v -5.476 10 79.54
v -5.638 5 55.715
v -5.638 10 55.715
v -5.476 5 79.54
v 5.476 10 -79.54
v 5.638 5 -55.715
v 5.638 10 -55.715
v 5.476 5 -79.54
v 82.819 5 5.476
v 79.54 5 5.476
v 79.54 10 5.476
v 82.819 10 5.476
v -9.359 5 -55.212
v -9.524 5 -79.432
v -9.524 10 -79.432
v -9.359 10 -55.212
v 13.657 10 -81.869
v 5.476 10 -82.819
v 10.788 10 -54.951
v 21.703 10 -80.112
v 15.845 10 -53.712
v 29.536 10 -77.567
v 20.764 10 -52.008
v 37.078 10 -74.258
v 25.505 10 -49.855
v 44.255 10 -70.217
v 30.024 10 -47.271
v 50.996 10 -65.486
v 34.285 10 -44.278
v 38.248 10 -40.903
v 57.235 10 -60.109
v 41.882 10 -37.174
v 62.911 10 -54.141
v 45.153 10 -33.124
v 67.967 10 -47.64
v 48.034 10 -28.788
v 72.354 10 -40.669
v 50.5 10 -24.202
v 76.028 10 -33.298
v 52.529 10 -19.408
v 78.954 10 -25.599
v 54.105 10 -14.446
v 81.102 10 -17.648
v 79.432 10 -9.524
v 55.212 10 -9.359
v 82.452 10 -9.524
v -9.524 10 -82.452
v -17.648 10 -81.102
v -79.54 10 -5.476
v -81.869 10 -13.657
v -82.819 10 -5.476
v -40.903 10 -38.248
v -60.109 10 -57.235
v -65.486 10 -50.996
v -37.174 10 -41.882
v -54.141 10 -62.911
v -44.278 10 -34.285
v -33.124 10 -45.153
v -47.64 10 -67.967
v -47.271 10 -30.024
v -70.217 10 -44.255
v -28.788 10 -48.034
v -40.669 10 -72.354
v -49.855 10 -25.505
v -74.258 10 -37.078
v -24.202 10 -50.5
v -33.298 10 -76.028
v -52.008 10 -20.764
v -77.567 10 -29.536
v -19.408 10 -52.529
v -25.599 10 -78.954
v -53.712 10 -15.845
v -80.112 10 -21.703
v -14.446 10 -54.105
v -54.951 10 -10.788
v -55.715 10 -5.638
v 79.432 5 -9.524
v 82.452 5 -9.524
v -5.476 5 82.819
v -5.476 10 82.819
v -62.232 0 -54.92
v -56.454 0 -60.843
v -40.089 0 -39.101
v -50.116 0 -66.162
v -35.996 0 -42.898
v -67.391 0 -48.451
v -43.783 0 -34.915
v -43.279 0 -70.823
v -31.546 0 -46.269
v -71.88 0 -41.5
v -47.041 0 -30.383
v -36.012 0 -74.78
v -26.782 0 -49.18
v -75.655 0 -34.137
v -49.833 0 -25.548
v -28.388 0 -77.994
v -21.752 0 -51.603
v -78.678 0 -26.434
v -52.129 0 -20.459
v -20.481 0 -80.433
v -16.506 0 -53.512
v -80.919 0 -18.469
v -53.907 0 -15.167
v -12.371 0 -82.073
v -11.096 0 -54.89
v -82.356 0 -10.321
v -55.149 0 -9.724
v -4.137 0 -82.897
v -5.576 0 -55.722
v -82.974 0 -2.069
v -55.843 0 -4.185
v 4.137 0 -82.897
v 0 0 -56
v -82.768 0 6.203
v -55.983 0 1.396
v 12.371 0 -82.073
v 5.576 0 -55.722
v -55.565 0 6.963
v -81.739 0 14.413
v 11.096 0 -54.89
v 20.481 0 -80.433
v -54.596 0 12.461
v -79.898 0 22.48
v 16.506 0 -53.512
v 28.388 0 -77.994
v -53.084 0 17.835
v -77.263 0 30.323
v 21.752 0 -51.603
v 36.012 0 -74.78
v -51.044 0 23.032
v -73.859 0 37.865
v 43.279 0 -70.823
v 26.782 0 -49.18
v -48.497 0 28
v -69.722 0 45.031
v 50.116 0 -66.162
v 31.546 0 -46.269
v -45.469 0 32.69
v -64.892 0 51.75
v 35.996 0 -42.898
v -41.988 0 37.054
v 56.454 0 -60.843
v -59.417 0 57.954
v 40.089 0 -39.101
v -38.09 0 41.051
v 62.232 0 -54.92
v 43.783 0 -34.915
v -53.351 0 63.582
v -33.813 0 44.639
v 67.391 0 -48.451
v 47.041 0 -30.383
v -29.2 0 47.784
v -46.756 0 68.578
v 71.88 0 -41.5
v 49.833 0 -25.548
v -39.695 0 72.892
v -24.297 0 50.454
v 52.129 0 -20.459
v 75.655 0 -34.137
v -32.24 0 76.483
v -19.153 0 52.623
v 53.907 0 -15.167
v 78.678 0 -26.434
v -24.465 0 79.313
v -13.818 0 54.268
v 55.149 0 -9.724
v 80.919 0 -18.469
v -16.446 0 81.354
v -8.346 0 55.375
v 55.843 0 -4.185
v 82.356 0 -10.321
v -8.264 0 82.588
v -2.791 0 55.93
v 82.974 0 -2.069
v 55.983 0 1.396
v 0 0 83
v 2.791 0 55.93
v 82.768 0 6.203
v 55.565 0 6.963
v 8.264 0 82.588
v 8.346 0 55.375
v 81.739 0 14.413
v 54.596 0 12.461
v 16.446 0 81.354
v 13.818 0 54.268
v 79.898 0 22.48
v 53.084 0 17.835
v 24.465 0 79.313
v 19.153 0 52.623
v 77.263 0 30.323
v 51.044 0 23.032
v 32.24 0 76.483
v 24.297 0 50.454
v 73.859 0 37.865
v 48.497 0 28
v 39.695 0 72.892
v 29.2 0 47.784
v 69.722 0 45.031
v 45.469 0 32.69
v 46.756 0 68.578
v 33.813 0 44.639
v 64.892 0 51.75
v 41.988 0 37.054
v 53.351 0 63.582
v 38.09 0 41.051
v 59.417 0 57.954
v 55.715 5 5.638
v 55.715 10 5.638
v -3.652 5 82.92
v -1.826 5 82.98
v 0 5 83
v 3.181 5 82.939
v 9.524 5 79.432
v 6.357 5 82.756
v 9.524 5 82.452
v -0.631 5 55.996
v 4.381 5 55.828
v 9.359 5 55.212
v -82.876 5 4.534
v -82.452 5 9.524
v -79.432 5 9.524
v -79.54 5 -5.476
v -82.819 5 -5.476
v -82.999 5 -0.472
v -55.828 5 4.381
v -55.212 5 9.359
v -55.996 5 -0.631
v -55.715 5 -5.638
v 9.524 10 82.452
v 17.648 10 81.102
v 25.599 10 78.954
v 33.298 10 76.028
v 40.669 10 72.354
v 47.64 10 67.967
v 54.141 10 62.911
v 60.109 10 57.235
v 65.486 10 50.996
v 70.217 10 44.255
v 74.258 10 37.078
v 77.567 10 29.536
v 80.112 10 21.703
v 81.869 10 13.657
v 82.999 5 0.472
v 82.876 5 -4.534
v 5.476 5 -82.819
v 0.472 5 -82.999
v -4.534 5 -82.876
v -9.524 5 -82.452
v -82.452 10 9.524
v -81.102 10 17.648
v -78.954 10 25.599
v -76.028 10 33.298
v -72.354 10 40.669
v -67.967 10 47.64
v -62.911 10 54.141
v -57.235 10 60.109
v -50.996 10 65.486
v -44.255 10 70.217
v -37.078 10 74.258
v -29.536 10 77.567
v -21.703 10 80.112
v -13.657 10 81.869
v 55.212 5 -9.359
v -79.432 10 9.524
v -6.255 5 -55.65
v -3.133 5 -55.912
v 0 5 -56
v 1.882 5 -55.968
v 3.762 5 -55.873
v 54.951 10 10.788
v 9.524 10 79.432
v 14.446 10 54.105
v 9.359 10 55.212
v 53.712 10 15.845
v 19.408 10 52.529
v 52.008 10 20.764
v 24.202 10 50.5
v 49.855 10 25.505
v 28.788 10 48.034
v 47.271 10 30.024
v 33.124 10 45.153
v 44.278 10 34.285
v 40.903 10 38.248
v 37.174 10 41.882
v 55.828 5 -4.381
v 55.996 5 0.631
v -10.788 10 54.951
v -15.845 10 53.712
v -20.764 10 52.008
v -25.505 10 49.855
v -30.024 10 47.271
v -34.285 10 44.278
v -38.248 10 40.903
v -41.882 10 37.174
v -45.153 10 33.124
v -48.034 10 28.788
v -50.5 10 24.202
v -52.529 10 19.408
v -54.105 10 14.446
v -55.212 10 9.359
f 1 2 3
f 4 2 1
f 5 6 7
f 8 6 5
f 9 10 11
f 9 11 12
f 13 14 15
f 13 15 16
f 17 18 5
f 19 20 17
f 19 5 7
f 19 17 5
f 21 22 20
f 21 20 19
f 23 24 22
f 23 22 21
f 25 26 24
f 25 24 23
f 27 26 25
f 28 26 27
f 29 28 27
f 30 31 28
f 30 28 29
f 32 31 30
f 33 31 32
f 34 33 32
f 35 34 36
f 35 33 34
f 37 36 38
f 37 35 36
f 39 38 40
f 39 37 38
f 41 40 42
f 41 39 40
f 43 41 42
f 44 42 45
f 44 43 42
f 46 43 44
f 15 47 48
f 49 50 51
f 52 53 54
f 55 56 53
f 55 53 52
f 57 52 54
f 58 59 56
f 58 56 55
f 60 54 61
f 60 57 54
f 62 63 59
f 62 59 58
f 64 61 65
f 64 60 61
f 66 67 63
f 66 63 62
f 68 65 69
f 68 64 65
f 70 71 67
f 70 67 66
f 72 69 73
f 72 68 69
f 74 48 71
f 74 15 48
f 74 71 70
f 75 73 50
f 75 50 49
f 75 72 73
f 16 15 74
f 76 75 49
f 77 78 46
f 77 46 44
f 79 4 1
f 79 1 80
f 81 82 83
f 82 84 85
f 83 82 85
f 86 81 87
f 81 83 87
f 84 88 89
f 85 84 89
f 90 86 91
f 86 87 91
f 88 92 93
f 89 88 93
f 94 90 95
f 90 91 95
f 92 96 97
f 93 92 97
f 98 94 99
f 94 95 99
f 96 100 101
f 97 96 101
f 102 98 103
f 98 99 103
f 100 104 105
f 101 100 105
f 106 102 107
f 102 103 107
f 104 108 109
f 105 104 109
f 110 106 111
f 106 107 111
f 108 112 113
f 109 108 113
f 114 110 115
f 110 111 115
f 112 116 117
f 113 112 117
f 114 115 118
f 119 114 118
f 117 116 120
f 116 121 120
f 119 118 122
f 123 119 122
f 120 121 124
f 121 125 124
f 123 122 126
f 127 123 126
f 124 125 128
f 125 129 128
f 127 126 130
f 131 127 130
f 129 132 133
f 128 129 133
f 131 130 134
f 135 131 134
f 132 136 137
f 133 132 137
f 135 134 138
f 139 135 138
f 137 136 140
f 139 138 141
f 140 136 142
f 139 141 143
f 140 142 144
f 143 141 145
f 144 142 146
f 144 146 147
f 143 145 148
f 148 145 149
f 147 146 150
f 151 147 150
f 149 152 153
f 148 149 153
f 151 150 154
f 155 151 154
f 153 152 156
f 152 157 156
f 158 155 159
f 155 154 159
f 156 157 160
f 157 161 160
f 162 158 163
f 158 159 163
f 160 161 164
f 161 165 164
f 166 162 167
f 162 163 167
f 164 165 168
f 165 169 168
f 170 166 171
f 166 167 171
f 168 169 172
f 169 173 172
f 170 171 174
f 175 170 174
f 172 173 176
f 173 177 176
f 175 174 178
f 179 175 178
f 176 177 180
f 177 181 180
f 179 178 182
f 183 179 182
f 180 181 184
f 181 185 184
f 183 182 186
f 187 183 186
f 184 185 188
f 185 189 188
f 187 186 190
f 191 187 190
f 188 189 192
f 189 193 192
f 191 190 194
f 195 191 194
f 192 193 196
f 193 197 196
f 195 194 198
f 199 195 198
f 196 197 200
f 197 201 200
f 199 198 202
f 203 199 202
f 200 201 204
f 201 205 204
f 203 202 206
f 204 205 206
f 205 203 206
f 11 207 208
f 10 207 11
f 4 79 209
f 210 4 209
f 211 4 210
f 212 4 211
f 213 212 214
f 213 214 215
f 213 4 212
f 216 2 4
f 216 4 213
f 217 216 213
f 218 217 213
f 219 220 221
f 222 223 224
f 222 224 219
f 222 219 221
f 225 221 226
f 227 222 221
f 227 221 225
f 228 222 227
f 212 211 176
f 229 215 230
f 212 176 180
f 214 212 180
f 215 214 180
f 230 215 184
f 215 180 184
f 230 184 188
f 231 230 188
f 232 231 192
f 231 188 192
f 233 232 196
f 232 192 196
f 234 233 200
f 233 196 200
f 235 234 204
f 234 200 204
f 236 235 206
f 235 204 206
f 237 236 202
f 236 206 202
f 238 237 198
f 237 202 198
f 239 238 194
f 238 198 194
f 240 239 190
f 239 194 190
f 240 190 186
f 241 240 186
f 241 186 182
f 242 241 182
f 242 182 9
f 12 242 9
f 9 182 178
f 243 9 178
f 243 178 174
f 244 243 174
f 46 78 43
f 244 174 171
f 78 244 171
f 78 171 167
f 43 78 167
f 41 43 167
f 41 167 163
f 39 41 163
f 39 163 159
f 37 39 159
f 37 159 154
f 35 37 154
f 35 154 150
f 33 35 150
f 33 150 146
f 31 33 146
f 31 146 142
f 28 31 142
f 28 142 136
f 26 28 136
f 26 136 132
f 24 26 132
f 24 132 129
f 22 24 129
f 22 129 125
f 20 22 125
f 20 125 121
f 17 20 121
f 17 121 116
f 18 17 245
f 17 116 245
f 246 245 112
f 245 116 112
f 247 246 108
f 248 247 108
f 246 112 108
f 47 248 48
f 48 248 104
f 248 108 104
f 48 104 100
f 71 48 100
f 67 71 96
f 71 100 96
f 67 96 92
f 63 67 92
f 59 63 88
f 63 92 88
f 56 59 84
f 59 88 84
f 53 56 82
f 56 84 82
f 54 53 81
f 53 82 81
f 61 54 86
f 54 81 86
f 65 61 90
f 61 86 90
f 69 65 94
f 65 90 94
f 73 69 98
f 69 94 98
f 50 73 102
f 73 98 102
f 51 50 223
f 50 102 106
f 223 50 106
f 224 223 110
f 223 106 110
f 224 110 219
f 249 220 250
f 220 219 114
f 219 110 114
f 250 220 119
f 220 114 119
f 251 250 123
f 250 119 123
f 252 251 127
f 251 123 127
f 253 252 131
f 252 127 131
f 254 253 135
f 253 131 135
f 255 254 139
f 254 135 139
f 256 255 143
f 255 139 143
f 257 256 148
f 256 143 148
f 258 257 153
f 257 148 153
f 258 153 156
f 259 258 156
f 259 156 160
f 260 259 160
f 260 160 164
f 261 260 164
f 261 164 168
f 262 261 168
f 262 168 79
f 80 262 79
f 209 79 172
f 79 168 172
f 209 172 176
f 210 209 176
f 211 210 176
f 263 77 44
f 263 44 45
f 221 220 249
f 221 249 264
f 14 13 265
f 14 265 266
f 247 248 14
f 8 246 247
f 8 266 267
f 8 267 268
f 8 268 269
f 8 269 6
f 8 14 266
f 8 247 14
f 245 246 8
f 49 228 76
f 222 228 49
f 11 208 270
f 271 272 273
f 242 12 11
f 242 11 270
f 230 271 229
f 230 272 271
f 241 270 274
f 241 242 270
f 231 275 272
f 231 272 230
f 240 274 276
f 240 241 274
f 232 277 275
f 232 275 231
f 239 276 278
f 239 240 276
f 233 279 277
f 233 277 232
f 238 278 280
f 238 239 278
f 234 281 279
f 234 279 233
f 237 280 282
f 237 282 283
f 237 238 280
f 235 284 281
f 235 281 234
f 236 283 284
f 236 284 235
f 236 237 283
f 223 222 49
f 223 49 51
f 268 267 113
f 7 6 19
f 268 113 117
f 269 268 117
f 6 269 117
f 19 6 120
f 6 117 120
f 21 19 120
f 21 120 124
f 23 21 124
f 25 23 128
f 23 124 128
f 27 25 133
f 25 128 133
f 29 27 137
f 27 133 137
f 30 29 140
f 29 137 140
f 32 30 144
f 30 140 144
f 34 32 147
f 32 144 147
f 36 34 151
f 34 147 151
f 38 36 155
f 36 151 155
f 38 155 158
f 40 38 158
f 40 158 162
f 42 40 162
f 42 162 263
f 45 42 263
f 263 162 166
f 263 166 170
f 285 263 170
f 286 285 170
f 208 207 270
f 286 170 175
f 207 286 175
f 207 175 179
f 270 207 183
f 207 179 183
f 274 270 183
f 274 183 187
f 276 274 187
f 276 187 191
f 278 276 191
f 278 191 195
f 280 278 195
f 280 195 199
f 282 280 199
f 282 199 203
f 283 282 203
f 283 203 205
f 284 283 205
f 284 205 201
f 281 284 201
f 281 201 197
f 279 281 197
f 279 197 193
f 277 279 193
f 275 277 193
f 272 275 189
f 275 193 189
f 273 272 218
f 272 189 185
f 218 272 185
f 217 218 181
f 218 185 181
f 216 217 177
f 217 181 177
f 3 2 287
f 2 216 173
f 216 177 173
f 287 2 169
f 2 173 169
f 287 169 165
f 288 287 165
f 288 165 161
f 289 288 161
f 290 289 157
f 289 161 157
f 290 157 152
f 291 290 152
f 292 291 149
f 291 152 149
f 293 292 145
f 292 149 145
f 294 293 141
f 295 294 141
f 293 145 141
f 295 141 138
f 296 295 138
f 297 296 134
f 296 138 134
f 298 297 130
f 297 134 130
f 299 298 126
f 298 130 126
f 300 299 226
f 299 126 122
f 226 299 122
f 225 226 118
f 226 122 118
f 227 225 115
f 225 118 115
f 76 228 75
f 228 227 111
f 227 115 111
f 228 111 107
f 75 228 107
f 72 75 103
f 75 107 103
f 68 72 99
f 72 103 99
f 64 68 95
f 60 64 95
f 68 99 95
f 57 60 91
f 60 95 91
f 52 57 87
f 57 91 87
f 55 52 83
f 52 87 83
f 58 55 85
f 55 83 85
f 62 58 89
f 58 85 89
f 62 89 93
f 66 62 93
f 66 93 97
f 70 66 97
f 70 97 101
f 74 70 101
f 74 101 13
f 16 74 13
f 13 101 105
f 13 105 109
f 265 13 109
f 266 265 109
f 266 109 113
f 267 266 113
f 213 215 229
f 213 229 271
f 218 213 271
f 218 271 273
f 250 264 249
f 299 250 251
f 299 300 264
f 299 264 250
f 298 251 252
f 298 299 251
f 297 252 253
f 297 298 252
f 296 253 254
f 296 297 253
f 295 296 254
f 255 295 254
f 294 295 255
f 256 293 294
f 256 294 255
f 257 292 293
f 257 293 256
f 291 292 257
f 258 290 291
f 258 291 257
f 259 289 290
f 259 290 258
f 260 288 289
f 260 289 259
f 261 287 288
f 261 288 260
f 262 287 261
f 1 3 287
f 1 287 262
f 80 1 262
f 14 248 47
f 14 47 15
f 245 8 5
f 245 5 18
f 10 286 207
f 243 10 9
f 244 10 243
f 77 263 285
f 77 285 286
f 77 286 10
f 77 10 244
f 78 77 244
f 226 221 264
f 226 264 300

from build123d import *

# Parameters (mm, degrees)
SKETCH1_R           = 83
BOSS_EXTRUDE1_DEPTH = 10
SKETCH3_R           = 56
CUT_EXTRUDE2_DEPTH  = 118.804923496
CUT_EXTRUDE4_START  = -5
CUT_EXTRUDE4_DEPTH  = 5


with BuildPart() as part:
    # Sketch1 → Boss-Extrude1 (new body)
    with BuildSketch(Plane(origin=(0, 0, 0), x_dir=(1, 0, 0), z_dir=(0, 1, 0))):
        with Locations(Location((0, 0, 0), (0, 0, 270))):
            Circle(SKETCH1_R)
    extrude(amount=BOSS_EXTRUDE1_DEPTH)

    # Sketch3 → Cut-Extrude2 (cut, through all)
    with BuildSketch(Plane.XZ):
        with Locations(Location((0, 0, 0), (0, 0, 270))):
            Circle(SKETCH3_R)
    extrude(amount=-CUT_EXTRUDE2_DEPTH, mode=Mode.SUBTRACT)

    # Sketch6 → Cut-Extrude4 (cut)
    with BuildSketch(Plane(origin=(0, 10, 0), x_dir=(1, 0, 0), z_dir=(0, 1, 0)).offset(CUT_EXTRUDE4_START)):
        with BuildLine():
            Line((55.715434798, -5.638290989), (79.539838583, -5.475879047))
            Line((79.539838583, -5.475879047), (82.819168969, -5.475879047))
            ThreePointArc((82.819168969, -5.475879047), (82.975116618, 2.032245607), (82.451795016, 9.523733443))
            Line((82.451795016, 9.523733443), (79.431867066, 9.523733443))
            Line((79.431867066, 9.523733443), (55.212462973, 9.358628767))
            ThreePointArc((55.212462973, 9.358628767), (55.968531574, 1.877091756), (55.715434798, -5.638290989))
        make_face()
        with BuildLine():
            Line((5.638290989, 55.715434798), (5.475879047, 79.539838583))
            Line((5.475879047, 79.539838583), (5.475879047, 82.819168969))
            ThreePointArc((5.475879047, 82.819168969), (-2.032245607, 82.975116618), (-9.523733443, 82.451795016))
            Line((-9.523733443, 82.451795016), (-9.523733443, 79.431867066))
            Line((-9.523733443, 79.431867066), (-9.358628767, 55.212462973))
            ThreePointArc((-9.358628767, 55.212462973), (-1.877091756, 55.968531574), (5.638290989, 55.715434798))
        make_face()
        with BuildLine():
            Line((-79.431867066, -9.523733443), (-55.212462973, -9.358628767))
            ThreePointArc((-55.212462973, -9.358628767), (-55.968531574, -1.877091756), (-55.715434798, 5.638290989))
            Line((-55.715434798, 5.638290989), (-79.539838583, 5.475879047))
            Line((-79.539838583, 5.475879047), (-82.819168969, 5.475879047))
            ThreePointArc((-82.819168969, 5.475879047), (-82.975116618, -2.032245607), (-82.451795016, -9.523733443))
            Line((-82.451795016, -9.523733443), (-79.431867066, -9.523733443))
        make_face()
        with BuildLine():
            Line((9.523733443, -79.431867066), (9.358628767, -55.212462973))
            ThreePointArc((9.358628767, -55.212462973), (1.877091756, -55.968531574), (-5.638290989, -55.715434798))
            Line((-5.638290989, -55.715434798), (-5.475879047, -79.539838583))
            Line((-5.475879047, -79.539838583), (-5.475879047, -82.819168969))
            ThreePointArc((-5.475879047, -82.819168969), (2.032245607, -82.975116618), (9.523733443, -82.451795016))
            Line((9.523733443, -82.451795016), (9.523733443, -79.431867066))
        make_face()
    extrude(amount=CUT_EXTRUDE4_DEPTH, mode=Mode.SUBTRACT)


solid = part.part
